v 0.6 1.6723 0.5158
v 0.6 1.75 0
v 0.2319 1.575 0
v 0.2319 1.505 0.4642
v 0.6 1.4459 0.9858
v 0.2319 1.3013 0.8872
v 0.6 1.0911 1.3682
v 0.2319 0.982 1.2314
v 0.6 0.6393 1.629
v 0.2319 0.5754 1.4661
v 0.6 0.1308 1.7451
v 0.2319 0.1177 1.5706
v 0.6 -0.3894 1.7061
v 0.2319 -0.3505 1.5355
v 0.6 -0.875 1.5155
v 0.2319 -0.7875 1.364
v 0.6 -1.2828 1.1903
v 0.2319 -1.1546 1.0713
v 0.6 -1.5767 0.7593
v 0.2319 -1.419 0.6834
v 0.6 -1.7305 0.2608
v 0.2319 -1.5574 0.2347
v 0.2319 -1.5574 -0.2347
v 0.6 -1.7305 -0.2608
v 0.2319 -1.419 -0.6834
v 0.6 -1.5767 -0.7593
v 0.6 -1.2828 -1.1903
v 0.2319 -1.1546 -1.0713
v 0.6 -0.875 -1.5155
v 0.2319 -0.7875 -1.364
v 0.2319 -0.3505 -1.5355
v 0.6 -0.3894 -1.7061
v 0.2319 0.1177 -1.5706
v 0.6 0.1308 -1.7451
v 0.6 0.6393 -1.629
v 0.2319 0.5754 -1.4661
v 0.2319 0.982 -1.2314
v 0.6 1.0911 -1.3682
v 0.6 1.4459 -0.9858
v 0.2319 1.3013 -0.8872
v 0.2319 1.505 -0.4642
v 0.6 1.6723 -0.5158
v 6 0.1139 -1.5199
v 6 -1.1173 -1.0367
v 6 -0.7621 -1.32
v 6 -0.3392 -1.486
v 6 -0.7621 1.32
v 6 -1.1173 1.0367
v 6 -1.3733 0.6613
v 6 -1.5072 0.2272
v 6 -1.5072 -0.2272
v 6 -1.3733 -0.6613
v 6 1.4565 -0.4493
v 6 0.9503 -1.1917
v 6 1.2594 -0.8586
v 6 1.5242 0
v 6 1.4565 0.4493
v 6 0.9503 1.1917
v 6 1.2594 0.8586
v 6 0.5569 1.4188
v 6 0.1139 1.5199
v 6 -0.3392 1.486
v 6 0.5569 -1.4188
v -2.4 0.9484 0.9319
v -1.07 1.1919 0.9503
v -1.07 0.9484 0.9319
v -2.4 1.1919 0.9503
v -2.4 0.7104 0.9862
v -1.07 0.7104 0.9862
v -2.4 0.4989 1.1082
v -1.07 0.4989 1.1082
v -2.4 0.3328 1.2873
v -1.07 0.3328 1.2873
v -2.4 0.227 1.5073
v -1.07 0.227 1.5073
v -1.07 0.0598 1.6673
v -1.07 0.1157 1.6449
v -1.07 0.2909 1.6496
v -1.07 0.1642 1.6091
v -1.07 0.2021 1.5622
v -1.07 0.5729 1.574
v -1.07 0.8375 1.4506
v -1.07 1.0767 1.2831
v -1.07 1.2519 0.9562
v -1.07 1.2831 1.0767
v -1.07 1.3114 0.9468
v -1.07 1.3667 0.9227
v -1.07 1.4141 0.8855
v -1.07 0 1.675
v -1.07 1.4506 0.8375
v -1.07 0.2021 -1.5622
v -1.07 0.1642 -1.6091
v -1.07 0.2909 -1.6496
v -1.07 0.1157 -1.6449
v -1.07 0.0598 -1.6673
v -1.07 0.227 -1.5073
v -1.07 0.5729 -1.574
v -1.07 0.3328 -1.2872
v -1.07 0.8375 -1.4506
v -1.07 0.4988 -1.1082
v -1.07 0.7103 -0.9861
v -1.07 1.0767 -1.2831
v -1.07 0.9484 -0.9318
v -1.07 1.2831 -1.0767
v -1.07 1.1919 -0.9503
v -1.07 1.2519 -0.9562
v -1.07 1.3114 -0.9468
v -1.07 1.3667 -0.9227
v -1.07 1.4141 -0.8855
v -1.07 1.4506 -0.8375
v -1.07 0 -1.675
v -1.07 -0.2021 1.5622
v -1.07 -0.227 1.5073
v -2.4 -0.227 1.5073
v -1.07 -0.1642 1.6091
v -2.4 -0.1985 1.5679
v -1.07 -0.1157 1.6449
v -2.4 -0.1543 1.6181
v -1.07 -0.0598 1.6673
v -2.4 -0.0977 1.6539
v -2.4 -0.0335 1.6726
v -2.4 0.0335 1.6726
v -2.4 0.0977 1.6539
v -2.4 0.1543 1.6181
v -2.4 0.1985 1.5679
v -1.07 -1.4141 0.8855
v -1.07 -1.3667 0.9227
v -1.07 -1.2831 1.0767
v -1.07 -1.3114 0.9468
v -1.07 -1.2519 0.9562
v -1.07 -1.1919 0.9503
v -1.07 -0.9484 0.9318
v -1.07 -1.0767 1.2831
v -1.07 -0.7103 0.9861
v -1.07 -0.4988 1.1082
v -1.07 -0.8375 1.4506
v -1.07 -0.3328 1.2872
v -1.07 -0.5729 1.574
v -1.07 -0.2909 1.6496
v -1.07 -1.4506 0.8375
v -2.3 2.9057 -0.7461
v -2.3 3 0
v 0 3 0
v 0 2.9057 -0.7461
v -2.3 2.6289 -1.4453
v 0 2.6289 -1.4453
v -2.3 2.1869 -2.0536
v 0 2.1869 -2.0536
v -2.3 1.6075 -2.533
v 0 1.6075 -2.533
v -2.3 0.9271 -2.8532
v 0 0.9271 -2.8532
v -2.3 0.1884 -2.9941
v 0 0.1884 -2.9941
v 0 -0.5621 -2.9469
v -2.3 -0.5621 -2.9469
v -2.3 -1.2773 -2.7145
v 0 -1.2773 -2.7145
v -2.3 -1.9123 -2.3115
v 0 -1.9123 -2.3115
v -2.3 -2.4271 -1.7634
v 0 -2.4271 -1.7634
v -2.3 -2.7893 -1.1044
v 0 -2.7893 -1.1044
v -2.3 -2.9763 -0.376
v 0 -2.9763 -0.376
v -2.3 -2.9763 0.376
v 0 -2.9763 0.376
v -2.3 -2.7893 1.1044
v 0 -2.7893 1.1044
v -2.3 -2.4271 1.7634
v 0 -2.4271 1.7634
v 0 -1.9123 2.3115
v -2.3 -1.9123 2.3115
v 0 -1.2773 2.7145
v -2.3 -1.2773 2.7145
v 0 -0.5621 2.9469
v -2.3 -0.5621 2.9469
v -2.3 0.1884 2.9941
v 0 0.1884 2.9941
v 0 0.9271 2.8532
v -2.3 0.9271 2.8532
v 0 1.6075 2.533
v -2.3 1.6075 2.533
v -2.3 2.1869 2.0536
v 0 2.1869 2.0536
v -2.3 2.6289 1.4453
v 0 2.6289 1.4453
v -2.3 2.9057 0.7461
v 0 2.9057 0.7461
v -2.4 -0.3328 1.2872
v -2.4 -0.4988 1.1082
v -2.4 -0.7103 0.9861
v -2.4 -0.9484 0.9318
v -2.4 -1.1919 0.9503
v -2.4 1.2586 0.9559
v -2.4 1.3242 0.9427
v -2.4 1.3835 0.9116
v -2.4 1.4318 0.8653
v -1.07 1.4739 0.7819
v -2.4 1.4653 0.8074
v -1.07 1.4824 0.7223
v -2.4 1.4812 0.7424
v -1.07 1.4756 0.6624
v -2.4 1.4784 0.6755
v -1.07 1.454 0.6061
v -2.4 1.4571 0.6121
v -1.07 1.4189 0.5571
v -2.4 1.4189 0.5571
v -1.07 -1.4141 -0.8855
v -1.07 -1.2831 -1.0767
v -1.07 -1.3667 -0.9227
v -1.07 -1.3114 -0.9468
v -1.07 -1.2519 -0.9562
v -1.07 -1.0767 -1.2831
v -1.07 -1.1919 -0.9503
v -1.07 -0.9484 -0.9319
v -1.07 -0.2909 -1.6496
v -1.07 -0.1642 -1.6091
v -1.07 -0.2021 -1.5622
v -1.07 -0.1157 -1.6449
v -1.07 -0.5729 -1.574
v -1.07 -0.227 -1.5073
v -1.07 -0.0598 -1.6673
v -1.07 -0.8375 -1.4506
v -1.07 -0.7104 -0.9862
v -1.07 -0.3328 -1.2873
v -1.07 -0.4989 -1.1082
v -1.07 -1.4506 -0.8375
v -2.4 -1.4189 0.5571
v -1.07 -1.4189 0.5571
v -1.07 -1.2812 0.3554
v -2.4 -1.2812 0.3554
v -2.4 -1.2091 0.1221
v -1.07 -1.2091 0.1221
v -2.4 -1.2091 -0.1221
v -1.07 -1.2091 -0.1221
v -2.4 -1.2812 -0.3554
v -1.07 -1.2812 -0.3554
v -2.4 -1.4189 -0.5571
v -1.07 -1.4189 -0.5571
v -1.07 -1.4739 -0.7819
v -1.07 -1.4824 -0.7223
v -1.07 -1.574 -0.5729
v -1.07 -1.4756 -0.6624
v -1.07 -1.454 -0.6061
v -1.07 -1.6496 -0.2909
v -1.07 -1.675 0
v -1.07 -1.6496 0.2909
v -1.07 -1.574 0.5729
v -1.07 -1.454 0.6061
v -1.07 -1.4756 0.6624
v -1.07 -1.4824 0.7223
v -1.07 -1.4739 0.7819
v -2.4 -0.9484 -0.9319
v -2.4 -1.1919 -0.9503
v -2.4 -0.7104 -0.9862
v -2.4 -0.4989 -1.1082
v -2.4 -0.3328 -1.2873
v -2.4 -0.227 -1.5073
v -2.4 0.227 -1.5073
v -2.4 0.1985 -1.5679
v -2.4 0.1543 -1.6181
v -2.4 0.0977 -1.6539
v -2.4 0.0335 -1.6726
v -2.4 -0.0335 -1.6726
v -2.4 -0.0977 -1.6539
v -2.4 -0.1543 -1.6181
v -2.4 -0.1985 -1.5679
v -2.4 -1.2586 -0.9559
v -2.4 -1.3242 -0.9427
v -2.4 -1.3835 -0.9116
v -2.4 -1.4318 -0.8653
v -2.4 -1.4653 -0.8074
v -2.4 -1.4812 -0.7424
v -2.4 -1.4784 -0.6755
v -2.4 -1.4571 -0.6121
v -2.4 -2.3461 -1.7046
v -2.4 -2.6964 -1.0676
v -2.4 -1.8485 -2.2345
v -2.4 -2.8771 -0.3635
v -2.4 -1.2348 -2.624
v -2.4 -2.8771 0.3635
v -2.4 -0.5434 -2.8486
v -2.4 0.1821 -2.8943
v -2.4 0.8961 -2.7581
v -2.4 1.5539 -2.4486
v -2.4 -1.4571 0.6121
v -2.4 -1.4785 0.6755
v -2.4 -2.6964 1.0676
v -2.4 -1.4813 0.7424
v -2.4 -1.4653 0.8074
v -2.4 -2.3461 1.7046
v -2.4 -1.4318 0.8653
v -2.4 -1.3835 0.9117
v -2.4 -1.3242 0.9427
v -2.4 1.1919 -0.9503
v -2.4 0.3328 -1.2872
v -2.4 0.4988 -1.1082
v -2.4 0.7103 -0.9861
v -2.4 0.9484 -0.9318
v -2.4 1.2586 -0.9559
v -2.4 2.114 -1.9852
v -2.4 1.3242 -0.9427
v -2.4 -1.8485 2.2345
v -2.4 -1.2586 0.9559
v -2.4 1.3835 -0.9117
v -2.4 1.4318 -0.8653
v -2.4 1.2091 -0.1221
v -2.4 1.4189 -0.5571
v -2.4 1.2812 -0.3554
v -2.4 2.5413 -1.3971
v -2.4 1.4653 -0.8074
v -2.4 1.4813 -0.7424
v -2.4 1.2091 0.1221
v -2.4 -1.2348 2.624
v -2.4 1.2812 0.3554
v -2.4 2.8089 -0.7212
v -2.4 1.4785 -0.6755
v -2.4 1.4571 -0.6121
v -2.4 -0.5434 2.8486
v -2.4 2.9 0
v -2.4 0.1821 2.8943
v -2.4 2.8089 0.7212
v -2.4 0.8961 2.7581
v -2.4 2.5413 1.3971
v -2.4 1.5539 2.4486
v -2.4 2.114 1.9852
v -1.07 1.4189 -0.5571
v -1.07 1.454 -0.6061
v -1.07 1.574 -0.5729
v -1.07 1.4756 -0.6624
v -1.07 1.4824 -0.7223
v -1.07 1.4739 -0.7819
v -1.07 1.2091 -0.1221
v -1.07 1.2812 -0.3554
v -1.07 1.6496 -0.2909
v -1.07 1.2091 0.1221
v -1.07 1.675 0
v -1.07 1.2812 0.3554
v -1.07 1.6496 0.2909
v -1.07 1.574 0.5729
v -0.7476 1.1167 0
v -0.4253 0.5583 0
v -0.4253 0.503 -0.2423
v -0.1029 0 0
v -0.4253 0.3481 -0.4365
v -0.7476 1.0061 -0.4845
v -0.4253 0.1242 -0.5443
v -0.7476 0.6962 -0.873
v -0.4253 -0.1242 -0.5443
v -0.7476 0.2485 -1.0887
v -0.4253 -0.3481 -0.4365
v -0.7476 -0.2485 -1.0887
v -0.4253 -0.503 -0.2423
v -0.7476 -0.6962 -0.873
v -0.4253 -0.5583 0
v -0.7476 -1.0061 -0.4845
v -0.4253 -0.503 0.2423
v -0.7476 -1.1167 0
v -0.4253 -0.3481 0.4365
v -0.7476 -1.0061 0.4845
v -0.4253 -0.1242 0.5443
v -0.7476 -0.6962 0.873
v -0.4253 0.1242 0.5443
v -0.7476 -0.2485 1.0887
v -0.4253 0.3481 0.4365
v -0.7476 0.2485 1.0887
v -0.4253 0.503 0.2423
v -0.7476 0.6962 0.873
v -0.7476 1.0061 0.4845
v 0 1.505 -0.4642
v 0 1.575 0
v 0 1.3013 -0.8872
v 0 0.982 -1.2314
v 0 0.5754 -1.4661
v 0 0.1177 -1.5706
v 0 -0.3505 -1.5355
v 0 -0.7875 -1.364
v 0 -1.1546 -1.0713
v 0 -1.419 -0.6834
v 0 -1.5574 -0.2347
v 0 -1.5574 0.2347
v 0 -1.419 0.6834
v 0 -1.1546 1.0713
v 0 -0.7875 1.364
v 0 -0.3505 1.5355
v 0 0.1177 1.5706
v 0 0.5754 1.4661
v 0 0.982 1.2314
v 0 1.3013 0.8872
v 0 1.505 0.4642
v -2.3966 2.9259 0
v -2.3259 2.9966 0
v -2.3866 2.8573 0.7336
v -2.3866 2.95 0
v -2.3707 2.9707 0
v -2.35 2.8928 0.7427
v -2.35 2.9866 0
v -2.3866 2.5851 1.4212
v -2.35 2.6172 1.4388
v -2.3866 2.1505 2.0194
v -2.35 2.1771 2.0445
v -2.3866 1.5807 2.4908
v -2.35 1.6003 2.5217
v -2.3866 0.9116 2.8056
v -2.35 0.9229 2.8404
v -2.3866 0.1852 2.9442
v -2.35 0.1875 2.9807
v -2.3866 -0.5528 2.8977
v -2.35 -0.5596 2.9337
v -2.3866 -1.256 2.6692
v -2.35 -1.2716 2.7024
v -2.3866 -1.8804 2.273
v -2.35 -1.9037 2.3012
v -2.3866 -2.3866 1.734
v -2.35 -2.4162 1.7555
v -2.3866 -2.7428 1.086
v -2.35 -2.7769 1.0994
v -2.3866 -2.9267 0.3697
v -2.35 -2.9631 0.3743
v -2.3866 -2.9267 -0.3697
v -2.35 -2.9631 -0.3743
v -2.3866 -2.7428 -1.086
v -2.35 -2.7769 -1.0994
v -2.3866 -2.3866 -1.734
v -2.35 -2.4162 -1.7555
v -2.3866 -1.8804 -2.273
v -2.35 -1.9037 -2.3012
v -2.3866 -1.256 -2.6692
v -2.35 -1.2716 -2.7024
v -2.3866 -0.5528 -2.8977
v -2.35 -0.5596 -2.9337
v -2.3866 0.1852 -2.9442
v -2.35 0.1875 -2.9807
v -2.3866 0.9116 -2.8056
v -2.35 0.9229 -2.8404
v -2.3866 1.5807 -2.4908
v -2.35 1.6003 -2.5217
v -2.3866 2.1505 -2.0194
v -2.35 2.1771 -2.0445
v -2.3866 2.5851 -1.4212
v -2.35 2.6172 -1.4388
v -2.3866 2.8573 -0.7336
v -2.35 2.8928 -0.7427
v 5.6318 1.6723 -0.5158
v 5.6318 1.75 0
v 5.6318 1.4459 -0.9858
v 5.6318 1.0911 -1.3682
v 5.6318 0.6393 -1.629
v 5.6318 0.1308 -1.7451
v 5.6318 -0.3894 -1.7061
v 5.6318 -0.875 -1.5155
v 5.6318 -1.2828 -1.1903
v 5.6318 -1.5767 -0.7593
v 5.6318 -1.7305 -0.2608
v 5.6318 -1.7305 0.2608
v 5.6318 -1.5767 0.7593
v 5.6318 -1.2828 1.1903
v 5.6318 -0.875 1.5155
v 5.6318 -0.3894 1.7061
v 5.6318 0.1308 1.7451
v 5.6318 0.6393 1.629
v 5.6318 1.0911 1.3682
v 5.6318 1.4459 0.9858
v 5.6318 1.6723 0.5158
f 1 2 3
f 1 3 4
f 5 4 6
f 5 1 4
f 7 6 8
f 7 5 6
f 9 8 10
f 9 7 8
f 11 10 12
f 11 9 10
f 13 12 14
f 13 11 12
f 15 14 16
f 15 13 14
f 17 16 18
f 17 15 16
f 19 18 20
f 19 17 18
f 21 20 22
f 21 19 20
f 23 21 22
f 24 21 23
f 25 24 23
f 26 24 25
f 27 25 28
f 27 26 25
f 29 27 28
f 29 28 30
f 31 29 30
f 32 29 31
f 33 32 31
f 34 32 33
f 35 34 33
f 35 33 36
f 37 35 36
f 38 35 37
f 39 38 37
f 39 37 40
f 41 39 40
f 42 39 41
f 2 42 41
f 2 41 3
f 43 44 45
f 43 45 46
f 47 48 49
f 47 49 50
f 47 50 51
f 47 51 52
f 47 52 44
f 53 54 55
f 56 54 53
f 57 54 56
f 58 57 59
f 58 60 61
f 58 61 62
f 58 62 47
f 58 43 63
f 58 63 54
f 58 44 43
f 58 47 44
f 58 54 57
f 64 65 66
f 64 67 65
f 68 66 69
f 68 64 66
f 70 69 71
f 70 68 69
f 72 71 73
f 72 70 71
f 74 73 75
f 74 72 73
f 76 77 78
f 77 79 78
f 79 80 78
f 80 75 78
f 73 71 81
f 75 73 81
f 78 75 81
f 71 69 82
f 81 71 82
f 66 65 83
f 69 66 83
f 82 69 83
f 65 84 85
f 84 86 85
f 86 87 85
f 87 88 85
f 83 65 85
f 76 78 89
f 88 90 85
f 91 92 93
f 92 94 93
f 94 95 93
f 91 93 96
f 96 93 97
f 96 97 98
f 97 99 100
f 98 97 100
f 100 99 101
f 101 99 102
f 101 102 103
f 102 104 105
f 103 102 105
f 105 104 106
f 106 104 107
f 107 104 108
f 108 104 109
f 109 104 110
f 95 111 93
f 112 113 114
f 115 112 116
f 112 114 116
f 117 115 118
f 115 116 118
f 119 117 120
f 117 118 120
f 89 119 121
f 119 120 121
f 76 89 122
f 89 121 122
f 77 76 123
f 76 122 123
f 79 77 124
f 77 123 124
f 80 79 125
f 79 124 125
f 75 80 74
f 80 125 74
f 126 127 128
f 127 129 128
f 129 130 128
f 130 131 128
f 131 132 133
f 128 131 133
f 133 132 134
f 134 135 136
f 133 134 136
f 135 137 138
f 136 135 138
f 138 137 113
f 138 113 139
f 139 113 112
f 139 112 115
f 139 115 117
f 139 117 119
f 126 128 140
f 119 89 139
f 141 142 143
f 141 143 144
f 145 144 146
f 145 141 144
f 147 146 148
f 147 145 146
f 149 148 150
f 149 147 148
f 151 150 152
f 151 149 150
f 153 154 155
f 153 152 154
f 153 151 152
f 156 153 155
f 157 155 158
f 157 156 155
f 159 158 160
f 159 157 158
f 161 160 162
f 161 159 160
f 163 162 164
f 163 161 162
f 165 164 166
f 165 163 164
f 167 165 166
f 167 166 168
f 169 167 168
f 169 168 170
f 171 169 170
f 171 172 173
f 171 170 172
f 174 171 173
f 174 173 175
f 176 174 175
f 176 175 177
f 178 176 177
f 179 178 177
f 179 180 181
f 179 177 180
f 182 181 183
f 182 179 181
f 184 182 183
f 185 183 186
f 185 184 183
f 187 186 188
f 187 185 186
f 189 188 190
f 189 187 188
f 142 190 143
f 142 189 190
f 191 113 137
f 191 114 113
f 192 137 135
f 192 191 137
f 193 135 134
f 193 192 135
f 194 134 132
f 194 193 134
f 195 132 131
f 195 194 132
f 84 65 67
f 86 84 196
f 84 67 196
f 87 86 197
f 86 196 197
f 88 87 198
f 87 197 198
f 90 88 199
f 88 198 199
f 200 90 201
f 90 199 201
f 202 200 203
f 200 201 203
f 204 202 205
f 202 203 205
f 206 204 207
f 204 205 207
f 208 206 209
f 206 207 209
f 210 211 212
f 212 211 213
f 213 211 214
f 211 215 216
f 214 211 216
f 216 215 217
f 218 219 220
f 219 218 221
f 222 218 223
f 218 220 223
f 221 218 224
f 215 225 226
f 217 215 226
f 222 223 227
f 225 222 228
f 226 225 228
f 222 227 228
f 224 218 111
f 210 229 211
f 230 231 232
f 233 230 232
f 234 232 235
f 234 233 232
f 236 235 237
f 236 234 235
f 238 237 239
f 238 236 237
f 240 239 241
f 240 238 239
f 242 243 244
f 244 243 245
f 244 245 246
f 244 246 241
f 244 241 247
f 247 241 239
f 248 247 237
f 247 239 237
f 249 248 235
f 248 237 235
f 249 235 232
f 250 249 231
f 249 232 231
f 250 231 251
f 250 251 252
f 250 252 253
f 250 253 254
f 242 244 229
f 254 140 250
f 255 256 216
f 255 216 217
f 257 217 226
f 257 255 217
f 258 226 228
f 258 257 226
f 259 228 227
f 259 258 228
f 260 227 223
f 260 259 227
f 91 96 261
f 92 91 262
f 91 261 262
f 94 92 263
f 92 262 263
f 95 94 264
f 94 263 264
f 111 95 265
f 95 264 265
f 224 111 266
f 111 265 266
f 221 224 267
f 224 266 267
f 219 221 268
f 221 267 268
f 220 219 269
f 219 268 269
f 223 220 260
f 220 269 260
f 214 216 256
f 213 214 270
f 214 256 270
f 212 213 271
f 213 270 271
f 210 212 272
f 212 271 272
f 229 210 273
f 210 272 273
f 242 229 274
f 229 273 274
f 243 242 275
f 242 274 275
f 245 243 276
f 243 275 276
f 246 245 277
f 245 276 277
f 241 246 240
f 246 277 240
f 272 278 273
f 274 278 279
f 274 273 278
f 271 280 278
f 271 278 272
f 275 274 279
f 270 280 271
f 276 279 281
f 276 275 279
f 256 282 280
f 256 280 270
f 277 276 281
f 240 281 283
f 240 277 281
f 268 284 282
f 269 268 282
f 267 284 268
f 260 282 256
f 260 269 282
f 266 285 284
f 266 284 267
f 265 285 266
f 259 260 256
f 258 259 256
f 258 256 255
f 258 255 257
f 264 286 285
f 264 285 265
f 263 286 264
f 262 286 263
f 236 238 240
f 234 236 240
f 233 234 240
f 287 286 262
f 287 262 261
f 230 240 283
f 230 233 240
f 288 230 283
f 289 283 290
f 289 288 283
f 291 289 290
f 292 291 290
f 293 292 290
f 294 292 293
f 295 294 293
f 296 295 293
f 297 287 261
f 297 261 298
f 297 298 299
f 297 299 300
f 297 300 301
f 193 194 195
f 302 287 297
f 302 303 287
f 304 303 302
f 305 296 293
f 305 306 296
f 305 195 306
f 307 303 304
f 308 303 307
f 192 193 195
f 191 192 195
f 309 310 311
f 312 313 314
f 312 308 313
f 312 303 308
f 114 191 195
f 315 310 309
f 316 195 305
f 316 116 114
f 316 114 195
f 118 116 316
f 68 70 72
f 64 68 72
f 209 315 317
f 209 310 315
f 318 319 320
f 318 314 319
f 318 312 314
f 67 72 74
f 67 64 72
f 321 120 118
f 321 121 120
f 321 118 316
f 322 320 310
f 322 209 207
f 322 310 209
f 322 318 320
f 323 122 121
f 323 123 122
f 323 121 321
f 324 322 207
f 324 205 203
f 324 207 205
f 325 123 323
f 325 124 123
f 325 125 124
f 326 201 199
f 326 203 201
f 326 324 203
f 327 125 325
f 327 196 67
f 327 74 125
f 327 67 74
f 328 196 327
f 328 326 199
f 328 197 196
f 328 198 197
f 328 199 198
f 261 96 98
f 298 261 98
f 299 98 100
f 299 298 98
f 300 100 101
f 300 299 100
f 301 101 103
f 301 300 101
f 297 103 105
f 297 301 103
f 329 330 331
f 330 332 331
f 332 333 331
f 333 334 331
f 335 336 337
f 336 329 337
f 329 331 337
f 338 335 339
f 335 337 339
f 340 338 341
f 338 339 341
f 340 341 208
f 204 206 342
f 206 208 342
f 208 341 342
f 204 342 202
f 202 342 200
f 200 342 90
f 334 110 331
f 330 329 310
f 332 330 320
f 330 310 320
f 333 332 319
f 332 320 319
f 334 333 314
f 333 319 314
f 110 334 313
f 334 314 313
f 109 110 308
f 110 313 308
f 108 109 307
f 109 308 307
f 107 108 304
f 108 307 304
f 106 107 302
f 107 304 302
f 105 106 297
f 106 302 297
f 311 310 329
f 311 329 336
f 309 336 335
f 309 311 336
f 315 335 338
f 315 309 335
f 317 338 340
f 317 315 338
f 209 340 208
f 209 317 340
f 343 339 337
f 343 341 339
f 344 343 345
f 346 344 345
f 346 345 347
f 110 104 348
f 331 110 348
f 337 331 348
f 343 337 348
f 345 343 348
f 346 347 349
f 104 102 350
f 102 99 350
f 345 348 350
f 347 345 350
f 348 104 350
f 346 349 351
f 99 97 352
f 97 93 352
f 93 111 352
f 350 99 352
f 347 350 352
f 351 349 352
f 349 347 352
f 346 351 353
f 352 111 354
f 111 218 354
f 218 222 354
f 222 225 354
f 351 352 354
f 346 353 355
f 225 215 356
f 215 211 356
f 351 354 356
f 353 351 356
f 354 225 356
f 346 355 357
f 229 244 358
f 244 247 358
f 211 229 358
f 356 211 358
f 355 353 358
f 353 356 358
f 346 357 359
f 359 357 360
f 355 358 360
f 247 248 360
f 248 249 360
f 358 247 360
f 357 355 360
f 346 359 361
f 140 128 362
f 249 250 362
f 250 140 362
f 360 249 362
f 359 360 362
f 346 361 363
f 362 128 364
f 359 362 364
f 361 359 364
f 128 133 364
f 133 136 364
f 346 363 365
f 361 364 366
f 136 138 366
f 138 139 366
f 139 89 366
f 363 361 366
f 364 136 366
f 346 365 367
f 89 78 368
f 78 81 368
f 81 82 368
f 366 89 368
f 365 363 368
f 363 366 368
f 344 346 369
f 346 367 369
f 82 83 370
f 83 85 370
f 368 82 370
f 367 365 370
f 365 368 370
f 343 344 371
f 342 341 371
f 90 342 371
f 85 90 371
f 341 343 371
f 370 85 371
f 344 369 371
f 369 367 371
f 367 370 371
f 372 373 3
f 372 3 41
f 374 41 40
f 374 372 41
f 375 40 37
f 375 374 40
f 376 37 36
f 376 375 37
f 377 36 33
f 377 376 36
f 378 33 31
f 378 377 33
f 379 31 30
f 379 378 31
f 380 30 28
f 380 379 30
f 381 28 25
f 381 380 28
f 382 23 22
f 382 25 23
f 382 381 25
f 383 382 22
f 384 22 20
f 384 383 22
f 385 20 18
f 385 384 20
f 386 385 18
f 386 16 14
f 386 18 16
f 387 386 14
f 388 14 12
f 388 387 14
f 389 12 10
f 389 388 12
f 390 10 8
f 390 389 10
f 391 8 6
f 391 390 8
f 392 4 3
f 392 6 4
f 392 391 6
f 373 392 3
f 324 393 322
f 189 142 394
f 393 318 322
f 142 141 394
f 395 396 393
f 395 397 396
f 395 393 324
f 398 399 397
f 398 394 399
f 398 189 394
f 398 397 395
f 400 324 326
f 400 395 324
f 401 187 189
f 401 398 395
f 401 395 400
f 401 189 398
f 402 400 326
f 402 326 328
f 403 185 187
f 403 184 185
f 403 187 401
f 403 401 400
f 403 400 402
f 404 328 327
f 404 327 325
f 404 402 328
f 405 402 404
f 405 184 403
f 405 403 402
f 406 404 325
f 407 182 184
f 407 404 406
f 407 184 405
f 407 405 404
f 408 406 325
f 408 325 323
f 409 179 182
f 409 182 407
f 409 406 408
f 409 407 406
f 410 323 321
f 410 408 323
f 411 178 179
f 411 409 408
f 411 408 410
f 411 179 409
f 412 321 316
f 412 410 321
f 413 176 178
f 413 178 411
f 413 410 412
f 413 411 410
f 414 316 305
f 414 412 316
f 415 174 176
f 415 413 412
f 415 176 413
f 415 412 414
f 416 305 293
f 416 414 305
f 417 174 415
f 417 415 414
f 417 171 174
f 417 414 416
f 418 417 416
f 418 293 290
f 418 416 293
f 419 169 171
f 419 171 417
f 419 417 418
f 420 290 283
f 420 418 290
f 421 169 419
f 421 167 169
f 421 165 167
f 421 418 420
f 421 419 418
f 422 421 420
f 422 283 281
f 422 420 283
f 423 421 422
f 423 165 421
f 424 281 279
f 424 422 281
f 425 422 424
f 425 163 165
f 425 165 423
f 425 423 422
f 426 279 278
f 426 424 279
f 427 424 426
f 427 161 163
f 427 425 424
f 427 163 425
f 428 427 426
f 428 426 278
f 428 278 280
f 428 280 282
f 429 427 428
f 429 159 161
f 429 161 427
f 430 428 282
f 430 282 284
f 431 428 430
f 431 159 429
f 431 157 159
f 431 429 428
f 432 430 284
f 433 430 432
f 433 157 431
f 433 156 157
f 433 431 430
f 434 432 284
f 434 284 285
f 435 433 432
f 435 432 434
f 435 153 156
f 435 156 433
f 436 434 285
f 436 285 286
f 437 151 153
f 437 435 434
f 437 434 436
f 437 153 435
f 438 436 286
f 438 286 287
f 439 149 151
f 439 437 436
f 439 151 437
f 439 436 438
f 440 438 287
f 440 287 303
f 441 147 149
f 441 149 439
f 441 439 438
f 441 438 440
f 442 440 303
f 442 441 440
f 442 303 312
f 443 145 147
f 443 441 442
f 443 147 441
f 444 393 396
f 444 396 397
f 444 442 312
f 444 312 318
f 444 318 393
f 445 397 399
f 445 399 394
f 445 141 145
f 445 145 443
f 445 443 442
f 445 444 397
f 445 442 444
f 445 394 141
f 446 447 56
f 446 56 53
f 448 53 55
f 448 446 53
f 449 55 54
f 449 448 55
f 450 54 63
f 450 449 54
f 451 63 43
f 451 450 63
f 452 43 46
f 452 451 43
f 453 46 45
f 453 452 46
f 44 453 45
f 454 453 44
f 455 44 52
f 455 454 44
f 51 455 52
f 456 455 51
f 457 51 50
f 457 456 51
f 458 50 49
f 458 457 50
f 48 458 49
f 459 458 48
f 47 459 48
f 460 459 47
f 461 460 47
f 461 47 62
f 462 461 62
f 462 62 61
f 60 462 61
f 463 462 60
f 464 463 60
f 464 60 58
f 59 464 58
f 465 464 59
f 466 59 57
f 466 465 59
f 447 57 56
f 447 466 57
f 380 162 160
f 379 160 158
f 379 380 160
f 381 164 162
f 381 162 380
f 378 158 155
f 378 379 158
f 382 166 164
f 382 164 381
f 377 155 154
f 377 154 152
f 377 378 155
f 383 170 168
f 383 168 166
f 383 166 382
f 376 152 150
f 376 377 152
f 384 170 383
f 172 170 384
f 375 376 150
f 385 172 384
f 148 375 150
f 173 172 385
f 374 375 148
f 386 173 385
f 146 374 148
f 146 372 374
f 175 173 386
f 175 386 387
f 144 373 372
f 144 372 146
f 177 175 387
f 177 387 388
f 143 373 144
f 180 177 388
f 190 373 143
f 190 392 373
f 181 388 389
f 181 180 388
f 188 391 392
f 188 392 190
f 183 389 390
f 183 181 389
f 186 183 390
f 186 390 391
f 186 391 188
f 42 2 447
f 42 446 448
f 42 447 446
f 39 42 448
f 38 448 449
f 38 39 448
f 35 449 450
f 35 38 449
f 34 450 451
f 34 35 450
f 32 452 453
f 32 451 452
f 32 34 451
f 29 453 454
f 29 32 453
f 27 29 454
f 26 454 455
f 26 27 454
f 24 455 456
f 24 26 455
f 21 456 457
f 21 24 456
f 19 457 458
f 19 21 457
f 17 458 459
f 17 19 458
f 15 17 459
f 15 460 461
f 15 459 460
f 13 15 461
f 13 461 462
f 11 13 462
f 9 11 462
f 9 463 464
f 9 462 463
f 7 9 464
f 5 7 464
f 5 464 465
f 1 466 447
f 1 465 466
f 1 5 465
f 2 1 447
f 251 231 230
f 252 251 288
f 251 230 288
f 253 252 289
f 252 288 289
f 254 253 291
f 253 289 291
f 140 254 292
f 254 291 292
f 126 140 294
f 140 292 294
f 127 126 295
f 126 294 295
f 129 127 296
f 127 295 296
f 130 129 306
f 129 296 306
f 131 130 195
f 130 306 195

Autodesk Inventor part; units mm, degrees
ref_plane "YZ Plane" through (0, 0, 0) normal (1, 0, 0) x (0, 1, 0)
ref_plane "XZ Plane" through (0, 0, 0) normal (0, 1, 0) x (-1, 0, 0)
sketch "Szkic1" plane through (0, 0, 0) normal (0, 0, 1) x (1, 0, 0)
  line L0 (-0.1029, 0) -> (6, 0)
  line L1 (6, 0) -> (6, 1.75)
  line L2 (6, 1.75) -> (0.6, 1.75)
  line L3 (0.6, 1.75) -> (0.2319, 1.575)
  line L4 (0.2319, 1.575) -> (0, 1.575)
  line L5 (0, 1.575) -> (0, 3)
  line L6 (0, 3) -> (-2.4, 3)
  line L7 (-2.4, 3) -> (-2.4, 1.675)
  line L8 (-2.4, 1.675) -> (-1.07, 1.675)
  line L9 (-1.07, 1.675) -> (-0.1029, 0)
  line L10 (-4.08, 0) -> (7.68, 0) projected
  line L11 (0, -0.6) -> (0, 3.6) projected
  line L12 (0.6, 1.75) -> (0, 1.75) construction
  dimension "d1" = 5.4
  dimension "d2" = 0.3681
  dimension "d3" = 2.4
  dimension "d4" = 1.33
  dimension "d5" = 60
  dimension "d6" = 3.5
  dimension "d7" = 3.15
  dimension "d8" = 3.35
  dimension "d9" = 6
  dimension "d20" = 6
revolve "Bryła" add sketch "Szkic1" angle 360 about axis through (-0.1029, 0, 0) along (1, 0, 0)
sketch "Szkic2" plane through (-2.4, 0, 0) normal (-1, 0, 0) x (0, 0, 1)
  line L0 (0, -4.2) -> (0, 4.2) projected
  line L1 (-4.2, 0) -> (4.2, 0) projected
  circle A0 centre (0, 0) radius 1.675 construction
  circle A1 centre (0, 0) radius 1.2 construction
  line L2 (0, 0) -> (1.4506, 0.8375) construction
  line L3 (0, 0) -> (0.8375, 1.4506) construction
  arc A2 (0.9503, 1.1919) -> (0.5571, 1.4189) centre (0.7188, 1.2449) ccw
  arc A3 (0.9503, 1.1919) -> (1.5073, 0.227) centre (1.7479, 1.0092) ccw
  arc A4 (1.5073, -0.227) -> (1.5073, 0.227) centre (1.4375, 0) ccw
  arc A5 (1.5073, -0.227) -> (0.9503, -1.1919) centre (1.7479, -1.0092) ccw
  arc A6 (-0.5571, 1.4189) -> (0.5571, 1.4189) centre (0, 2.0183) ccw
  arc A7 (-0.5571, 1.4189) -> (-0.9503, 1.1919) centre (-0.7188, 1.2449) ccw
  arc A8 (-1.5073, 0.227) -> (-0.9503, 1.1919) centre (-1.7479, 1.0092) ccw
  arc A9 (-1.5073, 0.227) -> (-1.5073, -0.227) centre (-1.4375, 0) ccw
  arc A10 (-0.9503, -1.1919) -> (-1.5073, -0.227) centre (-1.7479, -1.0092) ccw
  arc A11 (0.5571, -1.4189) -> (0.9503, -1.1919) centre (0.7188, -1.2449) ccw
  arc A12 (0.5571, -1.4189) -> (-0.5571, -1.4189) centre (0, -2.0183) ccw
  arc A13 (-0.9503, -1.1919) -> (-0.5571, -1.4189) centre (-0.7188, -1.2449) ccw
  circle A14 centre (0, 0) radius 1.675 projected
  dimension "d34" = 30
  dimension "d35" = 60
  dimension "d36" = 2.4
  dimension "d37" = 3.35
  dimension "d38" = 0.2375
extrude "Szczelina" add sketch "Szkic2" against normal blind 1.33 contours A14 A13 A12 L0 | L0 A12 A11 A14 | A14 A9 A10 A13 | A11 A5 A4 A14 | A14 A7 A8 A9 | A4 A3 A2 A14 | A6 A7 A14 L0 | L0 A14 A2 A6
fillet "Zaokrąglenie1" radius 0.1 1 edges at (-2.4, -3, 0)
thread "Gwint" size "M3.5x0.6" class "6g" standard "ISO Metric profile" length 5.4
chamfer "Faza1" distance 0.2258 distance2 0.3682 1 edges at (6, -1.75, 0) measured on face at (6, -0.5419, -0.4801)
ref_plane "Work Plane1" through (3.3, 0, 0) normal (0, -0.6362, -0.7715) x (1, 0, 0)
equation "\"d1\" = GEL"
equation "\"d2\" = GAL"
equation "\"d3\" = KOH"
equation "\"d4\" = INTI"
equation "\"d6\" = GD"
equation "\"d7\" = BDM"
equation "\"d8\" = SW"
equation "\"d9\" = KOD"
equation "\"d20\" = NLG"
equation "\"d36\" = E0"
equation "\"d37\" = SW"
equation "\"d38\" = -0.25 * E0 + 0.25 * SW"
equation "\"d11\" = INTI"
equation "\"d17\" = RR"
equation "\"d13\" = GEL"
equation "\"d15\" = -0.5 * SPD + 0.5 * GD"
equation "\"GD\" = NND"
equation "\"NLG\" = 6"
equation "\"GEL\" = 5.4"
equation "\"KOD\" = 6"
equation "\"KOH\" = 2.4"
equation "\"INTI\" = 1.33"
equation "\"GAL\" = 0.61345 * PTC"
equation "\"GUL\" = 0.61345 * PTC"
equation "\"BDM\" = 3.15"
equation "\"SW\" = 3.35"
equation "\"RR\" = 0.1"
equation "\"SPD\" = NND - 1.2269 * GAL"
equation "\"E0\" = 2.4"
equation "\"TOA\" = 30deg"
equation "\"GD1\" = THREADDIA - 1.2269 * PTC"
equation "\"THREADDIA\" = 3.5"
equation "\"PTC\" = 0.6"
equation "\"NND\" = 3.5"
equation "\"RRK\" = 0.26"
properties part number "NF E 25-111 - M3.5x6 Klasa właściwości 4.8" material "Stal, miękka"
